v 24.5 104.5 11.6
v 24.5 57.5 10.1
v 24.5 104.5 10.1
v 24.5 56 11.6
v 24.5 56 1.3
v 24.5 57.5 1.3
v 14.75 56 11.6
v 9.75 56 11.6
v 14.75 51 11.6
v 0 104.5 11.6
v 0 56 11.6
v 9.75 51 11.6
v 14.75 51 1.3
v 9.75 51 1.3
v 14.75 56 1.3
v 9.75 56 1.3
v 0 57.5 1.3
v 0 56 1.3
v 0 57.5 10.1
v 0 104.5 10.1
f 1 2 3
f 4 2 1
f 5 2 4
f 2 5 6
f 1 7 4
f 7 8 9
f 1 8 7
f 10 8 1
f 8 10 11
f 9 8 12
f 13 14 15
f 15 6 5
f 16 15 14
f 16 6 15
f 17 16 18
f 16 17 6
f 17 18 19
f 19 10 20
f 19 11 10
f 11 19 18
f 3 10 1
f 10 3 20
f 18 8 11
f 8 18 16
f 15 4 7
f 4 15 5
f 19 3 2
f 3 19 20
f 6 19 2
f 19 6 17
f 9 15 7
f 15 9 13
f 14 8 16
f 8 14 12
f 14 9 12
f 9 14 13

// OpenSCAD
/* Capacitive Soil Sensor case - Dave Hartburn April 2020
 *
 * Cover for a Capacitive Soil Moisture Sensor v1.2, intended to
 * protect from rain while outside.
 */
 
drawSensor=0;   // Set to 1 to show the sensor
drawMainCase=0; // Draw the main part of the casing
drawLid=1;

th=1.5;         // Thickness
marg=0.4;       // Space margin
caseH=15;       // Case height
caseL=50;       // Case length
bw=24.5;        // Board Width

if (drawSensor==1) {
    color([0.2,0.2,0.2]) drawSensor();
}

if (drawMainCase==1) {
    drawMainCase();
}

if (drawLid==1) {
    color([0,1,1]) drawLid();
}

module drawMainCase() {
   width=bw+(th+marg)*2;
   translate([-(th+marg),56,-th-marg]) {
        difference() {
            cube([width,caseL,caseH]);
            translate([th,0,th]) {
                cube([bw+(marg*2),caseL-th,caseH+10]);
            }
            // Slot for cable
            translate([(width-9.5)/2,caseL-7, -1]) {
                cube([9.5,4,th*5]);
            }
        }
        // Add 'holes'/lid support
        translate([th+marg,7,0]) {
            cylinder(d=2,h=5,$fn=64);
        }
        translate([bw+marg*2+th,7,0]) {
            cylinder(d=2,h=5,$fn=64);
        }
        // Top lid support
        translate([2,caseL-10,0]) {
            cube([2,10,caseH-(th*2+marg)]);
        }
        translate([bw+marg,caseL-10,0]) {
            cube([2,10,caseH-(th*2+marg)]);
        }
        // Add ridge for slots
        translate([0,0,caseH-th]) {
            difference() {
                cube([width,caseL,th]);
                translate([th*2,0,-1]) {
                    cube([width-4*th,caseL-2*th,th+2]);
                }
            }
        }
   }
}

module drawLid() {
    width=bw;
    length=caseL-th;
    height=caseH-(2*th+marg+1.3);
    translate([0,56,1.3]) {
        difference() {
            cube([width,length,height]);
            translate([0,th,0]) {
                cube([width,length-th,height-th]);
            }
        }
        // Add a 'handle'
        hw=5;
        translate([(width-hw)/2,-hw,0]) {
            cube([hw,hw,height]);
        }

    }
}

module drawSensor() {
    // Draw the sensor board
    
    // Main board
    difference() {
        hull() {
            cube([bw,85,1.3]);
            translate([11.5,-12,0]) cube([0.3,0.3,1.3]);
        }
        // Punch out two holes
        translate([0,63,-1]) {
            cylinder(d=5,h=3);
        }
        translate([bw,63,-1]) {
            cylinder(d=5,h=3);
        }
    }
    // Add connector
    translate([7,77,0]) {
        cube([10,10,8]);
    }
}
